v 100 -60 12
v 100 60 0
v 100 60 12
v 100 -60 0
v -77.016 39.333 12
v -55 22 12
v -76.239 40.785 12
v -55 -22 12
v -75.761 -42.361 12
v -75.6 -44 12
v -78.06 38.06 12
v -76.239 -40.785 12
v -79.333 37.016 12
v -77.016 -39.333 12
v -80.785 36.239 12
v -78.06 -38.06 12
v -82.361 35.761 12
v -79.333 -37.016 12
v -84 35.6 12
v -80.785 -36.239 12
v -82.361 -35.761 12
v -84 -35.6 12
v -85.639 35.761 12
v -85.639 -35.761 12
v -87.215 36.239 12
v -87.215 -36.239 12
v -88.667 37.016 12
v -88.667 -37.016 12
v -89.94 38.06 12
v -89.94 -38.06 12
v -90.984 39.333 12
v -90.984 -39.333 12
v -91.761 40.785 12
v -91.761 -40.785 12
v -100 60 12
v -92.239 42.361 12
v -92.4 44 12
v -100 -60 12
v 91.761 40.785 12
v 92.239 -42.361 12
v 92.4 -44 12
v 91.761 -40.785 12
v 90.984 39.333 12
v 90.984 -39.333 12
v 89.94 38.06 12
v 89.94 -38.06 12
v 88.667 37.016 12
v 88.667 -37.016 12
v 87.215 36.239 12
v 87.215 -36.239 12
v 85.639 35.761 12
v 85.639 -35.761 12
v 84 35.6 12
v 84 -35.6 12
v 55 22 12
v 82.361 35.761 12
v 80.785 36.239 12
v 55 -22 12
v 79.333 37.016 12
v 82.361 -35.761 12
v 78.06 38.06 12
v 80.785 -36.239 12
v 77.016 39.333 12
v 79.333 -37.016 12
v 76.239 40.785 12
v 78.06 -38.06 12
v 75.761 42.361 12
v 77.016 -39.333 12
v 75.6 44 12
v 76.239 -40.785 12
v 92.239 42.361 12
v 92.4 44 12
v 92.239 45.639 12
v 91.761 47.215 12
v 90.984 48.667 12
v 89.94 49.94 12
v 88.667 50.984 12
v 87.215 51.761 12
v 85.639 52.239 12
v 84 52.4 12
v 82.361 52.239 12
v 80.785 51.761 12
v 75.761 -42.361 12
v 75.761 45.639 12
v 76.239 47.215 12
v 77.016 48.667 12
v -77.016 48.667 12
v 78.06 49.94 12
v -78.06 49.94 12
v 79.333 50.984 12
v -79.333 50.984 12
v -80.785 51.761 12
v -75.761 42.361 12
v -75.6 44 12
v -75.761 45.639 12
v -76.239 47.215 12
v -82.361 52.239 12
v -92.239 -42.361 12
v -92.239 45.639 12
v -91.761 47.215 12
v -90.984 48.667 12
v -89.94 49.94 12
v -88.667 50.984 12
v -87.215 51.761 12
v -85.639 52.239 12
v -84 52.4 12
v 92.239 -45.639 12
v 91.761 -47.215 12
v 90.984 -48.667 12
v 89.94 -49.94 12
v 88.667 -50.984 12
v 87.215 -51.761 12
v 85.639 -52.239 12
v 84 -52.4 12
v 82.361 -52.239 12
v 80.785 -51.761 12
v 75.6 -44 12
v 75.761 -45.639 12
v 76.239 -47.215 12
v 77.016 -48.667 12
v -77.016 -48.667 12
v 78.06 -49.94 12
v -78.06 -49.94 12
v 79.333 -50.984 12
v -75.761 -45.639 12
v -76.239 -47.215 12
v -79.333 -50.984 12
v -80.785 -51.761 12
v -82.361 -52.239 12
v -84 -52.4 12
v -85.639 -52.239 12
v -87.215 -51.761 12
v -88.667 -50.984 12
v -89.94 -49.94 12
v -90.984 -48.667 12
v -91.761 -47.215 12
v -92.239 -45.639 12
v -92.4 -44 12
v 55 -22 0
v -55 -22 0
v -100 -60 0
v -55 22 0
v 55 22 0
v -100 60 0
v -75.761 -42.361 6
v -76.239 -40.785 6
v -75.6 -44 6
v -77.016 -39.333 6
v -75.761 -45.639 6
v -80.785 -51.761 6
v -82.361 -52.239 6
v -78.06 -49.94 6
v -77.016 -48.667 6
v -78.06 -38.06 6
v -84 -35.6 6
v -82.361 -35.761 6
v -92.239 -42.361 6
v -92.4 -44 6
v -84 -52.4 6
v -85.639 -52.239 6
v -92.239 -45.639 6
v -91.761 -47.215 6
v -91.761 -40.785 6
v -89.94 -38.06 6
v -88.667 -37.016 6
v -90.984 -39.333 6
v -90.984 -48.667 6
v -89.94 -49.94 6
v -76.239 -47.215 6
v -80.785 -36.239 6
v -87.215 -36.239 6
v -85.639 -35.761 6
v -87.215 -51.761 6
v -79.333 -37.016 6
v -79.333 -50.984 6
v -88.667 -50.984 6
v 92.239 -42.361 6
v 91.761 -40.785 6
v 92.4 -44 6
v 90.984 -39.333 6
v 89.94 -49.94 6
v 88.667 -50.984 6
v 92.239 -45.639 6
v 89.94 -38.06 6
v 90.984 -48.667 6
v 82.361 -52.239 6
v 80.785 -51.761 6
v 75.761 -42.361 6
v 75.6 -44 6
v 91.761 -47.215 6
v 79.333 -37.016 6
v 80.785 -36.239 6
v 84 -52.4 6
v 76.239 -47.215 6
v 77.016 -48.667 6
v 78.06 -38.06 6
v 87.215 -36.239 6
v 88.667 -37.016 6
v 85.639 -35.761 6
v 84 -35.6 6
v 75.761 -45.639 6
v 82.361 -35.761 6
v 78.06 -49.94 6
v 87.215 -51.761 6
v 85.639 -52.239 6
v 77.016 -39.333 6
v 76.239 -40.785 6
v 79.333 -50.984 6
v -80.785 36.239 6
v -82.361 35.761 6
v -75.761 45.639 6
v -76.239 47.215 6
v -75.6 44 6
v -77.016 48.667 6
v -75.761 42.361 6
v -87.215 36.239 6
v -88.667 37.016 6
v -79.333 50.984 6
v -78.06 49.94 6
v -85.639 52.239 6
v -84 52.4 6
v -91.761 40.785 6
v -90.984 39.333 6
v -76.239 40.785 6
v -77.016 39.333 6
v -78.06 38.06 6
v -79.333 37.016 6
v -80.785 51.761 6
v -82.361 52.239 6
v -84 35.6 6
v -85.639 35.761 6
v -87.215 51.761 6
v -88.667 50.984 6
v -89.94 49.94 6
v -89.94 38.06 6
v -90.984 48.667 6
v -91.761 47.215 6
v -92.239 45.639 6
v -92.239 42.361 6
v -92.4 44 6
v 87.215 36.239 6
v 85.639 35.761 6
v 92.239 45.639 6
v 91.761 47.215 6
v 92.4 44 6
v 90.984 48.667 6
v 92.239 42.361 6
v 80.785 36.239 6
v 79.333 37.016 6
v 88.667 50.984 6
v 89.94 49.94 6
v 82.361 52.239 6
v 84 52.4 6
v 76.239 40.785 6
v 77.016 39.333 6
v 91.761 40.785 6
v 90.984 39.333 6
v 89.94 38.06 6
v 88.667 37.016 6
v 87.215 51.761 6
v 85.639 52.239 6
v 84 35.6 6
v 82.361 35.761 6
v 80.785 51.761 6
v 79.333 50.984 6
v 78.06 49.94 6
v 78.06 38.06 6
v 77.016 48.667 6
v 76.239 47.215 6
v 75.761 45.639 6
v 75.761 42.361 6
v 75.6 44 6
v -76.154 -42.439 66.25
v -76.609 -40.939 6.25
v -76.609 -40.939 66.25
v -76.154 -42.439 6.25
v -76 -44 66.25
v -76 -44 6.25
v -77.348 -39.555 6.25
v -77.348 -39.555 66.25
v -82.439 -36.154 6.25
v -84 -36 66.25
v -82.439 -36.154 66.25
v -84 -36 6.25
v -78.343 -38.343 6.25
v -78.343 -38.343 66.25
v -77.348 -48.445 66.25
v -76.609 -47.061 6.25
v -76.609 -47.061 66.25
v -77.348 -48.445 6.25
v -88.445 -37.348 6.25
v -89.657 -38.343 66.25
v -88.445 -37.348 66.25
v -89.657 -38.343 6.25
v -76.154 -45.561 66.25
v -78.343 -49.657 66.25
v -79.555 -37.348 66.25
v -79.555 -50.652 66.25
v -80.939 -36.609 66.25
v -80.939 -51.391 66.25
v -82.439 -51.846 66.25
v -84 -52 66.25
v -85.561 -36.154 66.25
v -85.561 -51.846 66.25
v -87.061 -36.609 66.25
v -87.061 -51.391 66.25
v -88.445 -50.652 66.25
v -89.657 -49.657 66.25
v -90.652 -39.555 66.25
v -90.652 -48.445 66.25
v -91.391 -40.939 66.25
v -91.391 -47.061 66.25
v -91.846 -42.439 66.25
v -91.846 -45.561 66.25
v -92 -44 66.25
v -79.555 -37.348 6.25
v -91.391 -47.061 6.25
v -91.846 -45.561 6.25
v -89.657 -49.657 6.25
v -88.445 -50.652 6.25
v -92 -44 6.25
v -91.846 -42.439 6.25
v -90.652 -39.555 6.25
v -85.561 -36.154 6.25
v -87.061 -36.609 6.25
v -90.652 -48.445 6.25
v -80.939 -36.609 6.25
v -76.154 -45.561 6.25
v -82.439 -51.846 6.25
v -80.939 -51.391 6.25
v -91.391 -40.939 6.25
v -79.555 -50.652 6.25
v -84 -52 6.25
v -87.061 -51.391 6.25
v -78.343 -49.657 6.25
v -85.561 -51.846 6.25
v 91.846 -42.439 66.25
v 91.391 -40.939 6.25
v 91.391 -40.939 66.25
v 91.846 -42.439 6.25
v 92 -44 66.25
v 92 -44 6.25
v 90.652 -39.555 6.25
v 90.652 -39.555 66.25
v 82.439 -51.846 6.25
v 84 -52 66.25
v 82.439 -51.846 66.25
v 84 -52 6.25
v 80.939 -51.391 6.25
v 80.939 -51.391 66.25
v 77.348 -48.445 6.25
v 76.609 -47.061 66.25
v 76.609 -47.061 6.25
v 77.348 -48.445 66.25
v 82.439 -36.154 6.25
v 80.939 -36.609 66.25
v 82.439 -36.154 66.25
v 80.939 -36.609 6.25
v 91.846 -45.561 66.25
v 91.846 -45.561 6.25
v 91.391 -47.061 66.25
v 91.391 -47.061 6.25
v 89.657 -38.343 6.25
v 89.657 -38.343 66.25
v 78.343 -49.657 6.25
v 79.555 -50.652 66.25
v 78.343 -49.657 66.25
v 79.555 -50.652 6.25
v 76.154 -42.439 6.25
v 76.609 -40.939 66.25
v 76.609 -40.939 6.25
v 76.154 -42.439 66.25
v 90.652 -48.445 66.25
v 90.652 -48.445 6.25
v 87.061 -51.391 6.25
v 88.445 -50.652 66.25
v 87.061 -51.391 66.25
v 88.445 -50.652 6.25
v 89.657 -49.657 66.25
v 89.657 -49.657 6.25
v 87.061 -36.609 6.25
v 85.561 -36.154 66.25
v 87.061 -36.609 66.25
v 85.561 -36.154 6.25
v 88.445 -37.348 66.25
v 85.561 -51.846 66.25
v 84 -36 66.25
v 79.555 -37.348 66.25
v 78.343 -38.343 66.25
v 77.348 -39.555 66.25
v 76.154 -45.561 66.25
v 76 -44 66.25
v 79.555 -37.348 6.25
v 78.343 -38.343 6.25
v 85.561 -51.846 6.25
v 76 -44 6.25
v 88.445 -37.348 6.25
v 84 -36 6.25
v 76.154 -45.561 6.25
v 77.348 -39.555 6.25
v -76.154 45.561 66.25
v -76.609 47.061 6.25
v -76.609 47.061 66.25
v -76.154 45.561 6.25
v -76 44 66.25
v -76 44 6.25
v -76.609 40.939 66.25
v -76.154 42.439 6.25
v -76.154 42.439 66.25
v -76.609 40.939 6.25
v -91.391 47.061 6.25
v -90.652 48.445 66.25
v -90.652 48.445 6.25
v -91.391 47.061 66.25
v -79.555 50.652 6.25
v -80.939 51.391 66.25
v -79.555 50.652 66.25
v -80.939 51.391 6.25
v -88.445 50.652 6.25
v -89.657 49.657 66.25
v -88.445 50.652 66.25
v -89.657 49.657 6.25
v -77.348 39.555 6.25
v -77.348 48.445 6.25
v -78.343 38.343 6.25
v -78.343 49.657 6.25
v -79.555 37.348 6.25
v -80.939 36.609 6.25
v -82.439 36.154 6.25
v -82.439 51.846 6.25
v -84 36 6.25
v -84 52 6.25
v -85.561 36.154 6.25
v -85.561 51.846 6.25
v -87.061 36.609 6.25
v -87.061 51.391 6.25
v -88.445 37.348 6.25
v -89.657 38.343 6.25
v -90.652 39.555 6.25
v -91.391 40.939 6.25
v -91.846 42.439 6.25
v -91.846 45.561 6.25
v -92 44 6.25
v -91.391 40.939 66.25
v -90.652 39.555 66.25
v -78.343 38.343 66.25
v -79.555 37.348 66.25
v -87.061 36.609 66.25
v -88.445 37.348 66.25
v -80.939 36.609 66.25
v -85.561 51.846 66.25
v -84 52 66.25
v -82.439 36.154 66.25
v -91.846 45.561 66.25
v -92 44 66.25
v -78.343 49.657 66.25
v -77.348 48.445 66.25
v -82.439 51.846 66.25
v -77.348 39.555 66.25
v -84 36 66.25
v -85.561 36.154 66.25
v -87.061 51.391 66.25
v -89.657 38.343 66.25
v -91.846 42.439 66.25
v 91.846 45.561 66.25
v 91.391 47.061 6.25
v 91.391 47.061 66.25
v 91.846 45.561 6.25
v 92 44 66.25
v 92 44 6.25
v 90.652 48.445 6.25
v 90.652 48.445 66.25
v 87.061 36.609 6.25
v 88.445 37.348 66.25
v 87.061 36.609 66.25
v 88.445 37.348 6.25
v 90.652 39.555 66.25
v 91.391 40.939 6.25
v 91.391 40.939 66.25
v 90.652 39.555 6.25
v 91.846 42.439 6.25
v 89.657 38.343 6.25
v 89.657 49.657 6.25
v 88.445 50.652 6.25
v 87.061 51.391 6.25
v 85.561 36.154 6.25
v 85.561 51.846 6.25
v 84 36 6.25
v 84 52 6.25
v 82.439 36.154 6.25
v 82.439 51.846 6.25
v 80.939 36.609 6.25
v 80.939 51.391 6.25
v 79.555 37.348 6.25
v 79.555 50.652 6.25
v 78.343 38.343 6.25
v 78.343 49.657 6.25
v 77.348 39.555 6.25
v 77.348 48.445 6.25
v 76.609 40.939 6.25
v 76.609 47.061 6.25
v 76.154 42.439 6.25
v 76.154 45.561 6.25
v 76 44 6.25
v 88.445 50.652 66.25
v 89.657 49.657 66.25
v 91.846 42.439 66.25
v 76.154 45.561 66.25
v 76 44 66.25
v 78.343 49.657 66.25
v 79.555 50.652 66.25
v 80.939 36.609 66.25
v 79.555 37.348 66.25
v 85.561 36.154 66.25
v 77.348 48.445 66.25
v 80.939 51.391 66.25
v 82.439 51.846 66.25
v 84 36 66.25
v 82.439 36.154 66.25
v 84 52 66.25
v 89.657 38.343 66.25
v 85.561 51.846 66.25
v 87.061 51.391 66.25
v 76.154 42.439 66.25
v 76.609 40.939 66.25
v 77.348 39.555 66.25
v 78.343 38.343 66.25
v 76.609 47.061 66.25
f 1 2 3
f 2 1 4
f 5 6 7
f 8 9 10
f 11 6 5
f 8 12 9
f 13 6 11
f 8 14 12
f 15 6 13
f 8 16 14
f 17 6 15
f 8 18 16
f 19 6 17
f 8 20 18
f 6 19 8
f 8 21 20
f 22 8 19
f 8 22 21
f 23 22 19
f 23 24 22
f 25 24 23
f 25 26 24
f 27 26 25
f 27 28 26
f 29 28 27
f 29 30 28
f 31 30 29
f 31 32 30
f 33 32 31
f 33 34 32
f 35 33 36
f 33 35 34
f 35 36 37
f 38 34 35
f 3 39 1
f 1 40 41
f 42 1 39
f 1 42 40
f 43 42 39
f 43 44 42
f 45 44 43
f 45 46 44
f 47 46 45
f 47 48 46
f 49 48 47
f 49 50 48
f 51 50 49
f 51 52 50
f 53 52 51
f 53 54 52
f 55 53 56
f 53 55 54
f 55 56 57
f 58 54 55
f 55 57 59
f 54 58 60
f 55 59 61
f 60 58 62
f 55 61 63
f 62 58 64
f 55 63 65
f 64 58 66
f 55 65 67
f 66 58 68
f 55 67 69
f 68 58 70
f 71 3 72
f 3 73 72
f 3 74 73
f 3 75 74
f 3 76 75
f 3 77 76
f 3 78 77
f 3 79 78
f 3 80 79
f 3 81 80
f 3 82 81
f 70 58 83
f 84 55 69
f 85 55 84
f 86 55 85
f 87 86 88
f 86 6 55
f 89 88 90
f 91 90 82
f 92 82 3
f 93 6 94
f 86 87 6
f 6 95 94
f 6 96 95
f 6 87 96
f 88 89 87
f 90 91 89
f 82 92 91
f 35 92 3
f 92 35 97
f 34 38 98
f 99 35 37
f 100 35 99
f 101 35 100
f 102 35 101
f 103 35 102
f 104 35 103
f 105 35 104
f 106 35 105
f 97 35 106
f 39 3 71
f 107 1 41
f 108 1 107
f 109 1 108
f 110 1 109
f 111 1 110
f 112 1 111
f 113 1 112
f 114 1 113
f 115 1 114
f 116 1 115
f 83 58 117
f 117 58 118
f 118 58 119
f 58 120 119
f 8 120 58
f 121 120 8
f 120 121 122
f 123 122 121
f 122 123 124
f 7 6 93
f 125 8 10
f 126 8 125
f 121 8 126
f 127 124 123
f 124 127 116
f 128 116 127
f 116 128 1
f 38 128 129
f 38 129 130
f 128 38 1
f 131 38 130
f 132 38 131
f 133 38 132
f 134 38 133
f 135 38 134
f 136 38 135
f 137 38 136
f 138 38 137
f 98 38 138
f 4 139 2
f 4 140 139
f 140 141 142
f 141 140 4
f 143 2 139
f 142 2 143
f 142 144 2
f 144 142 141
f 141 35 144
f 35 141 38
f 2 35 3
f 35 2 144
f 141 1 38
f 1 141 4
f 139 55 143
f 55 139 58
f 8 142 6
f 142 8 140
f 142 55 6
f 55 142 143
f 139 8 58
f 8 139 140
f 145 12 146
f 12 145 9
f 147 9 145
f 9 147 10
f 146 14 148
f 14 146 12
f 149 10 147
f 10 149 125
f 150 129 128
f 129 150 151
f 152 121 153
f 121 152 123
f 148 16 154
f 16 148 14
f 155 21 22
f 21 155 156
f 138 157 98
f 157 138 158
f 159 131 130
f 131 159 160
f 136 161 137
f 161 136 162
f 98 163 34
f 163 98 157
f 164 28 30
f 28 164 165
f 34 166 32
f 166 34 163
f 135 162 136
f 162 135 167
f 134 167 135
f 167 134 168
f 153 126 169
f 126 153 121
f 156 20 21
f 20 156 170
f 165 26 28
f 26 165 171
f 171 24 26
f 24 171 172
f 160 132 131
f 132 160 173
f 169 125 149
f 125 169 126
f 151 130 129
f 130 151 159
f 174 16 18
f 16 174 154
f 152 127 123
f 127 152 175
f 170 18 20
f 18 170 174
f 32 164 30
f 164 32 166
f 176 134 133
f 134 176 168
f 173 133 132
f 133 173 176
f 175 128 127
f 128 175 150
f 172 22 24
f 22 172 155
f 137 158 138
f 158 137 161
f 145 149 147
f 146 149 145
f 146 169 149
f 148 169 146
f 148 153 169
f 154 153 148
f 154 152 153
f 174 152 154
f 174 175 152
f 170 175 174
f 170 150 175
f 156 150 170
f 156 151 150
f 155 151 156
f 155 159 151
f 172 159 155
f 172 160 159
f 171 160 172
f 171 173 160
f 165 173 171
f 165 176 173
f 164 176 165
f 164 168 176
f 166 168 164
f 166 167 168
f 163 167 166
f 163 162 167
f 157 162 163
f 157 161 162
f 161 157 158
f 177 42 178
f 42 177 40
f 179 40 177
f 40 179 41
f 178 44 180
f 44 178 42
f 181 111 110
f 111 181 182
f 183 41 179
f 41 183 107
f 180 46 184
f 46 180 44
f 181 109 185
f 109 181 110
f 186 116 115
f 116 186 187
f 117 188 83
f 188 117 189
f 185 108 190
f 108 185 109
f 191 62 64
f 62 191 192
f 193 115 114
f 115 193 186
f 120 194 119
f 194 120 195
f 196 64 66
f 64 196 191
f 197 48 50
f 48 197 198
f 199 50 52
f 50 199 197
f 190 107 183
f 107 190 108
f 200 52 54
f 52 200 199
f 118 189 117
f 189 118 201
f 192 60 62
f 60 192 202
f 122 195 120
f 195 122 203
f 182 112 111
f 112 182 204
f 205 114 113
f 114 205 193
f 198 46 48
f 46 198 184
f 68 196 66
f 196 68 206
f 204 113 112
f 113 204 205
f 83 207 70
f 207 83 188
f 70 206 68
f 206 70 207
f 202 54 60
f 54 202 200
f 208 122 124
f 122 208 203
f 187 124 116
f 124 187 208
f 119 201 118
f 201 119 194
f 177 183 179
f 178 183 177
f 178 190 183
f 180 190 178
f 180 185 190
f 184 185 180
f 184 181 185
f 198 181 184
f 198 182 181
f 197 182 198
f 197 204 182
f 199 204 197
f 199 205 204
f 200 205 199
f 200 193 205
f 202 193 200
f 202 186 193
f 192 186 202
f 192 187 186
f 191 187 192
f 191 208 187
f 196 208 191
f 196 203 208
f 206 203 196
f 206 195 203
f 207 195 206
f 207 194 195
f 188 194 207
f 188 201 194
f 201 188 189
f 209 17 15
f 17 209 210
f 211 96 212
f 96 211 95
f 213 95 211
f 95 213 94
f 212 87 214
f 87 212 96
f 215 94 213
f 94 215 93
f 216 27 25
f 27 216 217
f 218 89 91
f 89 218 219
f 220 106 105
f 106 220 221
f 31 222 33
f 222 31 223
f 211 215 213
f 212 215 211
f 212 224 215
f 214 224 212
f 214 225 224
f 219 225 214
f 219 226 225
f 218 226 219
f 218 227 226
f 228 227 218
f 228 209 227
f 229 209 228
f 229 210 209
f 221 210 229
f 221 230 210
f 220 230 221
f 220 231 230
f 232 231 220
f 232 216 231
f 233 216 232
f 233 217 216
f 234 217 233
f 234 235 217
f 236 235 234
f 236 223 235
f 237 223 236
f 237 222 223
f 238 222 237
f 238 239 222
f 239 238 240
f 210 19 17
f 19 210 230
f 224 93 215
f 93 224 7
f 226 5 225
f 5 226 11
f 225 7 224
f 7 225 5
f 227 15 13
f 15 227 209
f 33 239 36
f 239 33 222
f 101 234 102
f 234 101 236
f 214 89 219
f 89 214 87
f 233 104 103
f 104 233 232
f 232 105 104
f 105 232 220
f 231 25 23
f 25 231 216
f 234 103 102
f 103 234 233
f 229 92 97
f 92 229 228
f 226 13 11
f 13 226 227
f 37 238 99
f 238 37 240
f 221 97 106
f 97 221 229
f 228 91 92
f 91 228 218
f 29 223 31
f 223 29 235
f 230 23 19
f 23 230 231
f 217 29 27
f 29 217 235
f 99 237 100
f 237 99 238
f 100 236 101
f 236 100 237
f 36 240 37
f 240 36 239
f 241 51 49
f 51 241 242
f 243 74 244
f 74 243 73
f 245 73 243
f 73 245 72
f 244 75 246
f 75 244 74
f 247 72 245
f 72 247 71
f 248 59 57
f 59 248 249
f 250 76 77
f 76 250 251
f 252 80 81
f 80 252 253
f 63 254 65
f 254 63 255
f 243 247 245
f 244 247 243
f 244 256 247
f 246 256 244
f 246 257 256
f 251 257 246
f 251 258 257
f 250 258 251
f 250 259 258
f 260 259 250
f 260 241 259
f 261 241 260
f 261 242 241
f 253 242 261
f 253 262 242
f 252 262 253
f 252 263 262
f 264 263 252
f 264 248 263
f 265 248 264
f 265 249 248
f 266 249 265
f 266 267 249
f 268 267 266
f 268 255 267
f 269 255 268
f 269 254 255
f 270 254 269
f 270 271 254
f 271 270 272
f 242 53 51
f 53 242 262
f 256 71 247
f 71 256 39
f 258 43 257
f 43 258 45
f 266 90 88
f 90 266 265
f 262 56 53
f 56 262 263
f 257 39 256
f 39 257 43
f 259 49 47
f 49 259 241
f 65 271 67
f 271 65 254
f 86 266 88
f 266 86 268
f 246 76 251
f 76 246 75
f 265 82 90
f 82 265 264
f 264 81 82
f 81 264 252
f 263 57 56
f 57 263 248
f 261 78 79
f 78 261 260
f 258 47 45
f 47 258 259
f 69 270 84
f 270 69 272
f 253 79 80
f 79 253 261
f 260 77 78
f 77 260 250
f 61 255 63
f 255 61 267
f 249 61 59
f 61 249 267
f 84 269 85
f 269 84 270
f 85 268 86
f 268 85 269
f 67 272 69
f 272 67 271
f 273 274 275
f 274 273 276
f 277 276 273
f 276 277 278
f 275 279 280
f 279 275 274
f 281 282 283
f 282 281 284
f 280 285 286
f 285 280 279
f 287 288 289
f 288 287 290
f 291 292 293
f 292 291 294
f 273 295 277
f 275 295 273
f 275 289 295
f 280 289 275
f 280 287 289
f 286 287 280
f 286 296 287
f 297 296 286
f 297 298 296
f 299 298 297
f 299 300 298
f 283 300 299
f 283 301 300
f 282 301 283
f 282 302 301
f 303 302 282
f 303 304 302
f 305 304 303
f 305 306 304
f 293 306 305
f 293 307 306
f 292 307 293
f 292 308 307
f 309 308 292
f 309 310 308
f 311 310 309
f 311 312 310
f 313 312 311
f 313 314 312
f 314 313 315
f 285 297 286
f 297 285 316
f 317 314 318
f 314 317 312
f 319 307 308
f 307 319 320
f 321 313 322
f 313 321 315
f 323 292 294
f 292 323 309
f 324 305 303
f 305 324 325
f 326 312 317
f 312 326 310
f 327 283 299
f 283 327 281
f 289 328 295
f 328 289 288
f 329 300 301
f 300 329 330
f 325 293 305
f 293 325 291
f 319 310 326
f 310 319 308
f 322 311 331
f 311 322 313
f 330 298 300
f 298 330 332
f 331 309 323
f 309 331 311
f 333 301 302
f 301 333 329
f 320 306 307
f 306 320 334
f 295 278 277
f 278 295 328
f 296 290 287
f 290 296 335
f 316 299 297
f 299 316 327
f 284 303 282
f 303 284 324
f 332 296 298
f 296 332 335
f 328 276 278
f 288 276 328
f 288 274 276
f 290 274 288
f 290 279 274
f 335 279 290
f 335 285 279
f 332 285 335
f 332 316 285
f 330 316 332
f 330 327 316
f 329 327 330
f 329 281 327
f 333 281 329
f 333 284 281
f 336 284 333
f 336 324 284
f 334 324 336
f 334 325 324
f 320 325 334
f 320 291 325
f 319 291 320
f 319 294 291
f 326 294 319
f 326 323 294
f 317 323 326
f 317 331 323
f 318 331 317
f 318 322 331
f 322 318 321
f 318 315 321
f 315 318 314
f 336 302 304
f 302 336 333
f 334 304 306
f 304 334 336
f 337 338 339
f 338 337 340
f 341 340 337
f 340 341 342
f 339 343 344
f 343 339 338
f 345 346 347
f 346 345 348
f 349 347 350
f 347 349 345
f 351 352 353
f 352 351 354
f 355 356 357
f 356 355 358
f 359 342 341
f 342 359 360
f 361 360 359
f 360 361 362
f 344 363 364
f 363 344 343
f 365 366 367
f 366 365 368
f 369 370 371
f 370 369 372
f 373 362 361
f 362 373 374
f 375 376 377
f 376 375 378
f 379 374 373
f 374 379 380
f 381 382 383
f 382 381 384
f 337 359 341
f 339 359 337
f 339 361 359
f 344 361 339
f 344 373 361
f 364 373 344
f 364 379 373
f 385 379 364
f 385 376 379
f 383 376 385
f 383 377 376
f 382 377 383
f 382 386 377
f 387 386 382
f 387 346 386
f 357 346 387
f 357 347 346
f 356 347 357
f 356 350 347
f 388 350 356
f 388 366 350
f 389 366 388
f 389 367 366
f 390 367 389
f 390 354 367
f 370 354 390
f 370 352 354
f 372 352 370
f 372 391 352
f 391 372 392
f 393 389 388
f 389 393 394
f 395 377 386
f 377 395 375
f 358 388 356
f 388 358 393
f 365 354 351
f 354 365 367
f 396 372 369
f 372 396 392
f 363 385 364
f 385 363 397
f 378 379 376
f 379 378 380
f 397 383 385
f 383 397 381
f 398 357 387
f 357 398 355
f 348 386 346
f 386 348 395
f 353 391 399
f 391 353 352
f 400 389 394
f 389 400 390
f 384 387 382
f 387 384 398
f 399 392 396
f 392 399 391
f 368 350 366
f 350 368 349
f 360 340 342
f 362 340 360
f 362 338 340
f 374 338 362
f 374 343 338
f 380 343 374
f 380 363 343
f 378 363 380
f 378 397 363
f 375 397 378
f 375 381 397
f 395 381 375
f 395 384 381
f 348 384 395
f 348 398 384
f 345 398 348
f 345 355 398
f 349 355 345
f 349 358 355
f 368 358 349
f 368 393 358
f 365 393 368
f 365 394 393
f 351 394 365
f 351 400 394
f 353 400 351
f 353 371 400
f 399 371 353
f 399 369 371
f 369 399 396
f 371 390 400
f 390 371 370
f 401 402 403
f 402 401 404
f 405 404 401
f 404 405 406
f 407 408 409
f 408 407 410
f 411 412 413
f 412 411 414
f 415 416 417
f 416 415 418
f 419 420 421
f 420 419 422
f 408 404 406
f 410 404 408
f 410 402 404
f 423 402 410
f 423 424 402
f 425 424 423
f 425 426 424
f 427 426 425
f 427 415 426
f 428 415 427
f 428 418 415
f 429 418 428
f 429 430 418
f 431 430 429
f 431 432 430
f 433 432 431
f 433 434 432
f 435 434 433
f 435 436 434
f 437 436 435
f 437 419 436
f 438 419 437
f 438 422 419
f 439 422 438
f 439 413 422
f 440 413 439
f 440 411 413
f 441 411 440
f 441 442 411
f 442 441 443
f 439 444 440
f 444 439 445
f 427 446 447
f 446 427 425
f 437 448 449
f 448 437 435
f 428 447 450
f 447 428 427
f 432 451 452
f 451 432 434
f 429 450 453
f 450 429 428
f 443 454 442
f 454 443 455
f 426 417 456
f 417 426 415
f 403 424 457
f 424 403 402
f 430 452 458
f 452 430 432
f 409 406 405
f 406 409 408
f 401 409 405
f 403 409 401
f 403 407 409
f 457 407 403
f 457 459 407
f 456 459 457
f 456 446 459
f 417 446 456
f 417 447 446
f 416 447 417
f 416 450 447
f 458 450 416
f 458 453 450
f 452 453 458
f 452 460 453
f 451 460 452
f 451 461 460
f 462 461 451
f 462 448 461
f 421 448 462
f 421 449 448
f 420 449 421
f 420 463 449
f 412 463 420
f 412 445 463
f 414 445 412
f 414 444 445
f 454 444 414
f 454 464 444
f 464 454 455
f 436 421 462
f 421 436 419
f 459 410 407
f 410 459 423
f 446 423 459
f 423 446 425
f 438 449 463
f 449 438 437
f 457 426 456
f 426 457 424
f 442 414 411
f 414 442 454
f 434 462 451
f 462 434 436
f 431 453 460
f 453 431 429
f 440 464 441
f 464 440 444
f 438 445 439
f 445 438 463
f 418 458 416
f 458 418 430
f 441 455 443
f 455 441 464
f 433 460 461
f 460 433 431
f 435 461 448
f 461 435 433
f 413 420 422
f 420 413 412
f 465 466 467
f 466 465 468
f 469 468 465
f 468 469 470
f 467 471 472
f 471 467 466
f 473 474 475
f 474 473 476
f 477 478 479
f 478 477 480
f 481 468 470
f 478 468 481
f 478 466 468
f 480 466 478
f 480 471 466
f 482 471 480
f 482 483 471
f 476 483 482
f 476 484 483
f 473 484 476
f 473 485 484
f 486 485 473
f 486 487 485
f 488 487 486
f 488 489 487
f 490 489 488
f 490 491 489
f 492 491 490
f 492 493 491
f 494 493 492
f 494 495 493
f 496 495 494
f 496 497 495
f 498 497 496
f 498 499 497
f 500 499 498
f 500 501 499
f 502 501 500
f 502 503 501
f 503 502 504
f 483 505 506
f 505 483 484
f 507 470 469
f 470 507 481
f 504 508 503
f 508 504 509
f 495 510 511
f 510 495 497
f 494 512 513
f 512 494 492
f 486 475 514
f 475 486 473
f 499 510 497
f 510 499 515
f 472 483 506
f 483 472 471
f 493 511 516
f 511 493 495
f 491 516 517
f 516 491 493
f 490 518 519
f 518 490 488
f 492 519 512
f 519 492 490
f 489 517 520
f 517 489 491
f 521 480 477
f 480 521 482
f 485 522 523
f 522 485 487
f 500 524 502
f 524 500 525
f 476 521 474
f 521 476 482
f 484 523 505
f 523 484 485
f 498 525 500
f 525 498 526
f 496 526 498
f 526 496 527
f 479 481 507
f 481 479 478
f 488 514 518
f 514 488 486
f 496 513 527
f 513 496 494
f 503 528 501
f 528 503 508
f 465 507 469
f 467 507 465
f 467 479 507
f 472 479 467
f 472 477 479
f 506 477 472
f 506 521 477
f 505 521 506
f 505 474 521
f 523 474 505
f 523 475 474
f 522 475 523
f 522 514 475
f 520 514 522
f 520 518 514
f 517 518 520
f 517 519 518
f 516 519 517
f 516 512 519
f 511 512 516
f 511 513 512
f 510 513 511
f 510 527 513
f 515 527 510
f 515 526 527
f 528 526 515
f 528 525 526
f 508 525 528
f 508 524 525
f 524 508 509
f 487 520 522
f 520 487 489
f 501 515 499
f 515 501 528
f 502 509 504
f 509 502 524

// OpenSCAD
$fn = 32;

// ------------------------------------------------------------------------
// Frame with four posts: 200 x 120 mm frame, four d16 posts
// Every part is its own module, assembly() places them once.
// ------------------------------------------------------------------------

// --- part 1 ---
module base_frame() {
  difference() {
    translate([-100, -60, 0]) cube([200, 120, 12]);
    translate([-55, -22, -1]) cube([110, 44, 14]);
    translate([-84, -44, 6]) cylinder(h = 7, d = 16.8);
    translate([84, -44, 6]) cylinder(h = 7, d = 16.8);
    translate([-84, 44, 6]) cylinder(h = 7, d = 16.8);
    translate([84, 44, 6]) cylinder(h = 7, d = 16.8);
  }
}

// --- part 2 ---
module post1() {
  cylinder(h = 60, d = 16);
}

// --- part 3 ---
module post2() {
  cylinder(h = 60, d = 16);
}

// --- part 4 ---
module post3() {
  cylinder(h = 60, d = 16);
}

// --- part 5 ---
module post4() {
  cylinder(h = 60, d = 16);
}

// --- assembly ---
module assembly() {
  translate([0, 0, 0]) rotate([0, 0, 0]) base_frame();
  translate([-84, -44, 6.25]) rotate([0, 0, 0]) post1();
  translate([84, -44, 6.25]) rotate([0, 0, 0]) post2();
  translate([-84, 44, 6.25]) rotate([0, 0, 0]) post3();
  translate([84, 44, 6.25]) rotate([0, 0, 0]) post4();
}

assembly();
